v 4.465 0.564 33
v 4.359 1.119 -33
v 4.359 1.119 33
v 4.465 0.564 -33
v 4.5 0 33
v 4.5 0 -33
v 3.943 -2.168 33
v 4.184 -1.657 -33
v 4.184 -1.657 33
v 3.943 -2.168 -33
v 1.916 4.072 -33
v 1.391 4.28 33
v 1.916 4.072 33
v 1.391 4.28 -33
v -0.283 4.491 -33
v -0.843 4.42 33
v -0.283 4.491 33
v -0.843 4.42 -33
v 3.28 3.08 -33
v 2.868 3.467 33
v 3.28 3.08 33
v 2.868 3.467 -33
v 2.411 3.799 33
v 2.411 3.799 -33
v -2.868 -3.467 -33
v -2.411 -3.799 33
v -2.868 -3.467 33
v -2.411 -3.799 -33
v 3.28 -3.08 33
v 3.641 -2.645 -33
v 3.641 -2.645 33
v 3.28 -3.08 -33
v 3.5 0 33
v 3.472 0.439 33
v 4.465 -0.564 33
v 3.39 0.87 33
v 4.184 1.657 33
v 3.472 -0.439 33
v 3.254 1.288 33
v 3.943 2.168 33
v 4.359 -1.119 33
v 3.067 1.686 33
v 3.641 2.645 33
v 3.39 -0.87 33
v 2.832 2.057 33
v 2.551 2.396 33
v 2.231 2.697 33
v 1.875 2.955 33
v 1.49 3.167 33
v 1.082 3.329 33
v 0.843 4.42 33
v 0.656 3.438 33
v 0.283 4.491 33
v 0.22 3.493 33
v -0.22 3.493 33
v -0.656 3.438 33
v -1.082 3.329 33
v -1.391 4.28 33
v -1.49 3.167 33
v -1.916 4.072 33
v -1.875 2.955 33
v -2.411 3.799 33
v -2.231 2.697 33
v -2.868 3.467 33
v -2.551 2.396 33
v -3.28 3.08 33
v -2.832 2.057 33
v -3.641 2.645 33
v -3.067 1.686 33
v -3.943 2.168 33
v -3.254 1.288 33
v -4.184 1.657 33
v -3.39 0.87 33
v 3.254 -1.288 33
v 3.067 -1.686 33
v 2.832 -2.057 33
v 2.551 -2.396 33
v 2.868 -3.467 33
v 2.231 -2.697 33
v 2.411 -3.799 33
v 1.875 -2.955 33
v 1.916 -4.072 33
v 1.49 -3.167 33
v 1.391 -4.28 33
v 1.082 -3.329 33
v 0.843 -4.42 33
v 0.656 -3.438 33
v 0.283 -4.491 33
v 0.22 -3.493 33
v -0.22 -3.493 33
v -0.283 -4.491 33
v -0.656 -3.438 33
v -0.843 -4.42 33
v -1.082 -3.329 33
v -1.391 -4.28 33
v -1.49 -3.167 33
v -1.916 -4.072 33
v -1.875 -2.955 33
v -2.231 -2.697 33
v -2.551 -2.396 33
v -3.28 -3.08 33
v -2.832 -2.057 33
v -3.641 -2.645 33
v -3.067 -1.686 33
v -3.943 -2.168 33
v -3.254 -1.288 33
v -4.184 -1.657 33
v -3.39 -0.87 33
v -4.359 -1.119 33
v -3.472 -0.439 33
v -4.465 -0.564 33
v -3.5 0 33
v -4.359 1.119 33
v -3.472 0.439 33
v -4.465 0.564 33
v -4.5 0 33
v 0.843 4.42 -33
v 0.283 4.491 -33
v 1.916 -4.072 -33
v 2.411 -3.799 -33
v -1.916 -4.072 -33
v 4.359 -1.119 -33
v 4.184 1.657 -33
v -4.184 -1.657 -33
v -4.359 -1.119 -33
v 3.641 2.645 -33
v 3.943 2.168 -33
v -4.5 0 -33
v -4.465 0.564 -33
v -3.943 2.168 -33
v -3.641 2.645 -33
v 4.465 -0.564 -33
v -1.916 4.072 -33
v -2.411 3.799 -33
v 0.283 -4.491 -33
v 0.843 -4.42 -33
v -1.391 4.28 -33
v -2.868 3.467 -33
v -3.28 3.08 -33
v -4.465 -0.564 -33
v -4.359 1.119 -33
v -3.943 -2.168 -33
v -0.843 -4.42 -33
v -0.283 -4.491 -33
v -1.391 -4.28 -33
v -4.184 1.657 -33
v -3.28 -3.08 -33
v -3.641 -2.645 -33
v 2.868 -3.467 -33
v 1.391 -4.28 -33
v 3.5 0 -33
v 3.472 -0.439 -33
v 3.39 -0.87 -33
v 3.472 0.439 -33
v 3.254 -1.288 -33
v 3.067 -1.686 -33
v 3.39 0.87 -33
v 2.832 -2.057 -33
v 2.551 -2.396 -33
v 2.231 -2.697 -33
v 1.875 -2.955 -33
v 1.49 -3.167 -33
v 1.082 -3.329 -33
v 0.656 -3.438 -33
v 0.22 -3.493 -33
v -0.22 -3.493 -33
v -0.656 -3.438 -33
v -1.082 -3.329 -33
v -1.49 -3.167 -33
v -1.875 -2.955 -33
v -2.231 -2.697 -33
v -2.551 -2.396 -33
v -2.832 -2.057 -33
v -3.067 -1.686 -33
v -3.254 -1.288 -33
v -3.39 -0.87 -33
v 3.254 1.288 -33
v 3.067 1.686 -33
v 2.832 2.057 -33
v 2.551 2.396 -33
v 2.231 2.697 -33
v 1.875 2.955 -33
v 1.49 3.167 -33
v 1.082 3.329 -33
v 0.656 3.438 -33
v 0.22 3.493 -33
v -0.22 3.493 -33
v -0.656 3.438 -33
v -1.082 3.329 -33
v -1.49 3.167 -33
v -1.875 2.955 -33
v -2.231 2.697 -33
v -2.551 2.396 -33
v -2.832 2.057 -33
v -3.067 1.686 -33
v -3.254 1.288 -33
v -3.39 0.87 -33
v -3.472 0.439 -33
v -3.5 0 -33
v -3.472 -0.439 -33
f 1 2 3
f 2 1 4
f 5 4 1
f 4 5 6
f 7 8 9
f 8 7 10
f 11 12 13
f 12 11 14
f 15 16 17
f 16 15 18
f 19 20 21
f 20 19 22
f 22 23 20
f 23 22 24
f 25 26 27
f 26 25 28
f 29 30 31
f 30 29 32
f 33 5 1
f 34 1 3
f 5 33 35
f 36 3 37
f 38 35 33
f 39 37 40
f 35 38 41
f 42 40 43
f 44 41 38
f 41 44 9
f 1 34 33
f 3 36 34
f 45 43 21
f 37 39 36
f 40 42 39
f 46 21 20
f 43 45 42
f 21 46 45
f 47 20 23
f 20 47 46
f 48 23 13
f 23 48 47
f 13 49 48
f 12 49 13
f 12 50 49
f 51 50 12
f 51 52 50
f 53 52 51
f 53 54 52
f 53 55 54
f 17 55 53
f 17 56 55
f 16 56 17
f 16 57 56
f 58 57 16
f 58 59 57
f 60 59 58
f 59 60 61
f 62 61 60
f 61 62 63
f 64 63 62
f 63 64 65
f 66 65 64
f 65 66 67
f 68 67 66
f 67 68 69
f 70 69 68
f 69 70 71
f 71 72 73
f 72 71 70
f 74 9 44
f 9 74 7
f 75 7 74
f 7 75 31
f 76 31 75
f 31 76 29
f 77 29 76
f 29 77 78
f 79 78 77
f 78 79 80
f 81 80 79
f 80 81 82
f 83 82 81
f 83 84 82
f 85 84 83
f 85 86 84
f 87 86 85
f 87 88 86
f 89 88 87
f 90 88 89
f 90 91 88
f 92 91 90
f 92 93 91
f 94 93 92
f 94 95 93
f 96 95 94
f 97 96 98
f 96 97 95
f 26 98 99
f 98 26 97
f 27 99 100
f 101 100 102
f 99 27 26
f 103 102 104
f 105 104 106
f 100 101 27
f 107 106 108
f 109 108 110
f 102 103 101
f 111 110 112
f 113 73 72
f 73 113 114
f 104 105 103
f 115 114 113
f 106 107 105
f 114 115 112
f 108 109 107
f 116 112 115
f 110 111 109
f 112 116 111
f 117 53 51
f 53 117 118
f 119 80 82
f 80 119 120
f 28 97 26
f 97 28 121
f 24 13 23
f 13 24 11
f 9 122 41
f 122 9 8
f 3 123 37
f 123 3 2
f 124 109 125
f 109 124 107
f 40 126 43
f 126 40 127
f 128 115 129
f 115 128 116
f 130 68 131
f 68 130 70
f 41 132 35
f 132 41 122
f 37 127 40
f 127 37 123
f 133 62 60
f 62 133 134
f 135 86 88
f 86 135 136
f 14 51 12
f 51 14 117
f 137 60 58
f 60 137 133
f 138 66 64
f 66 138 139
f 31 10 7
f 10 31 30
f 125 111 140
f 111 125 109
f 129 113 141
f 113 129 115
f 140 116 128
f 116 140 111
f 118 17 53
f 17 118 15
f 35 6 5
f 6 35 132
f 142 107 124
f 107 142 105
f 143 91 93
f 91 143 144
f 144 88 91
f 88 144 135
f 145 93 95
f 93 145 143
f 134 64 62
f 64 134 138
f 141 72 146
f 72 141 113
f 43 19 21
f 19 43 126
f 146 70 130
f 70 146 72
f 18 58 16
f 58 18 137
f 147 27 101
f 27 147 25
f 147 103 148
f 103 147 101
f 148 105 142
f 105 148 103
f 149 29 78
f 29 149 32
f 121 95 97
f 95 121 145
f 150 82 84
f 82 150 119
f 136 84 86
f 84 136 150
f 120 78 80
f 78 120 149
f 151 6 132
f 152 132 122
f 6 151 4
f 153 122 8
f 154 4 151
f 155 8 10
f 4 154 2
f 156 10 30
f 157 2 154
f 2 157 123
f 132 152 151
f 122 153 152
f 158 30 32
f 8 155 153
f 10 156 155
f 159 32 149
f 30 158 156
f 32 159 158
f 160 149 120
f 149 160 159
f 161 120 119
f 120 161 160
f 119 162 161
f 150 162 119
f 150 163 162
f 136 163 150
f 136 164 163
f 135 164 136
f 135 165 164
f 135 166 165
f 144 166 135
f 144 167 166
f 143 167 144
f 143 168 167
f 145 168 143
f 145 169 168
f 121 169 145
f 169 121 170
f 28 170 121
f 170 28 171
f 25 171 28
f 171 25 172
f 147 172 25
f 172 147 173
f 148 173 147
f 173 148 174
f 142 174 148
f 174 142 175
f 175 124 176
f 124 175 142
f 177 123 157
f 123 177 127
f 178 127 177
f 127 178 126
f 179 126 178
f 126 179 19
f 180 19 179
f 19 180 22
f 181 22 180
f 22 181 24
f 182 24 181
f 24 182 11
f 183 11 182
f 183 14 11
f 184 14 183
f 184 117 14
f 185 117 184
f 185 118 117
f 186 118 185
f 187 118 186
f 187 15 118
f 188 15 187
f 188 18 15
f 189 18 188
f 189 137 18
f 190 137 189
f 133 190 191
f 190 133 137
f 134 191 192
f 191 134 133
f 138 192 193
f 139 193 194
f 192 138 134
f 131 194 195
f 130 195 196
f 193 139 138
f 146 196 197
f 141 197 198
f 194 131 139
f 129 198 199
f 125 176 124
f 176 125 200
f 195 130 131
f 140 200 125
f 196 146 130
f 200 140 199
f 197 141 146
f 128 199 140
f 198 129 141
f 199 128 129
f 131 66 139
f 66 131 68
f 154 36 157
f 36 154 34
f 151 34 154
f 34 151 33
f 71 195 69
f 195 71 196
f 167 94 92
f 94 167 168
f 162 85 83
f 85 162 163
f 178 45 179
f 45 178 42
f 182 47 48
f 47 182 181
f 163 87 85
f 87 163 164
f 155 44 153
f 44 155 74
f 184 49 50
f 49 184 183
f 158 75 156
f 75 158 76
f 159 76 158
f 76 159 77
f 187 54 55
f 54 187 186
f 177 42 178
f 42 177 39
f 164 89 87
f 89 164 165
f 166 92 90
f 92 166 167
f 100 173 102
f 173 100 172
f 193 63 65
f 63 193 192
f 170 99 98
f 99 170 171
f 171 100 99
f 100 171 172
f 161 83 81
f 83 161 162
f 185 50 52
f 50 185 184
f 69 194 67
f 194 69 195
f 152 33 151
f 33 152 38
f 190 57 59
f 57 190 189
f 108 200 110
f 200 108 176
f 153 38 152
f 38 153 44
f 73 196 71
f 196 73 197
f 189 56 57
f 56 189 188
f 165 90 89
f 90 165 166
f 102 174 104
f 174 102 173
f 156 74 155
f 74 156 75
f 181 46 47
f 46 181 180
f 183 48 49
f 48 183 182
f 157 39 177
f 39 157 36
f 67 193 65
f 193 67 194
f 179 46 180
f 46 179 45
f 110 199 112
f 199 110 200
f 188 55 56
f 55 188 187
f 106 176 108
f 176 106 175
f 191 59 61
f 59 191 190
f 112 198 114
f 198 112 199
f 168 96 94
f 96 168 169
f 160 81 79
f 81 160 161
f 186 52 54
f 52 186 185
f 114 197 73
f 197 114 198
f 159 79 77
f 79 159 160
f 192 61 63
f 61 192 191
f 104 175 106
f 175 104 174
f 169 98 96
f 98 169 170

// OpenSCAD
$fn = 50;


difference() {
	union() {
		translate(v = [0, 0, -33.0000000000]) {
			cylinder(h = 66, r = 4.5000000000);
		}
	}
	union() {
		translate(v = [0, 0, -100.0000000000]) {
			cylinder(h = 200, r = 3.5000000000);
		}
	}
}
